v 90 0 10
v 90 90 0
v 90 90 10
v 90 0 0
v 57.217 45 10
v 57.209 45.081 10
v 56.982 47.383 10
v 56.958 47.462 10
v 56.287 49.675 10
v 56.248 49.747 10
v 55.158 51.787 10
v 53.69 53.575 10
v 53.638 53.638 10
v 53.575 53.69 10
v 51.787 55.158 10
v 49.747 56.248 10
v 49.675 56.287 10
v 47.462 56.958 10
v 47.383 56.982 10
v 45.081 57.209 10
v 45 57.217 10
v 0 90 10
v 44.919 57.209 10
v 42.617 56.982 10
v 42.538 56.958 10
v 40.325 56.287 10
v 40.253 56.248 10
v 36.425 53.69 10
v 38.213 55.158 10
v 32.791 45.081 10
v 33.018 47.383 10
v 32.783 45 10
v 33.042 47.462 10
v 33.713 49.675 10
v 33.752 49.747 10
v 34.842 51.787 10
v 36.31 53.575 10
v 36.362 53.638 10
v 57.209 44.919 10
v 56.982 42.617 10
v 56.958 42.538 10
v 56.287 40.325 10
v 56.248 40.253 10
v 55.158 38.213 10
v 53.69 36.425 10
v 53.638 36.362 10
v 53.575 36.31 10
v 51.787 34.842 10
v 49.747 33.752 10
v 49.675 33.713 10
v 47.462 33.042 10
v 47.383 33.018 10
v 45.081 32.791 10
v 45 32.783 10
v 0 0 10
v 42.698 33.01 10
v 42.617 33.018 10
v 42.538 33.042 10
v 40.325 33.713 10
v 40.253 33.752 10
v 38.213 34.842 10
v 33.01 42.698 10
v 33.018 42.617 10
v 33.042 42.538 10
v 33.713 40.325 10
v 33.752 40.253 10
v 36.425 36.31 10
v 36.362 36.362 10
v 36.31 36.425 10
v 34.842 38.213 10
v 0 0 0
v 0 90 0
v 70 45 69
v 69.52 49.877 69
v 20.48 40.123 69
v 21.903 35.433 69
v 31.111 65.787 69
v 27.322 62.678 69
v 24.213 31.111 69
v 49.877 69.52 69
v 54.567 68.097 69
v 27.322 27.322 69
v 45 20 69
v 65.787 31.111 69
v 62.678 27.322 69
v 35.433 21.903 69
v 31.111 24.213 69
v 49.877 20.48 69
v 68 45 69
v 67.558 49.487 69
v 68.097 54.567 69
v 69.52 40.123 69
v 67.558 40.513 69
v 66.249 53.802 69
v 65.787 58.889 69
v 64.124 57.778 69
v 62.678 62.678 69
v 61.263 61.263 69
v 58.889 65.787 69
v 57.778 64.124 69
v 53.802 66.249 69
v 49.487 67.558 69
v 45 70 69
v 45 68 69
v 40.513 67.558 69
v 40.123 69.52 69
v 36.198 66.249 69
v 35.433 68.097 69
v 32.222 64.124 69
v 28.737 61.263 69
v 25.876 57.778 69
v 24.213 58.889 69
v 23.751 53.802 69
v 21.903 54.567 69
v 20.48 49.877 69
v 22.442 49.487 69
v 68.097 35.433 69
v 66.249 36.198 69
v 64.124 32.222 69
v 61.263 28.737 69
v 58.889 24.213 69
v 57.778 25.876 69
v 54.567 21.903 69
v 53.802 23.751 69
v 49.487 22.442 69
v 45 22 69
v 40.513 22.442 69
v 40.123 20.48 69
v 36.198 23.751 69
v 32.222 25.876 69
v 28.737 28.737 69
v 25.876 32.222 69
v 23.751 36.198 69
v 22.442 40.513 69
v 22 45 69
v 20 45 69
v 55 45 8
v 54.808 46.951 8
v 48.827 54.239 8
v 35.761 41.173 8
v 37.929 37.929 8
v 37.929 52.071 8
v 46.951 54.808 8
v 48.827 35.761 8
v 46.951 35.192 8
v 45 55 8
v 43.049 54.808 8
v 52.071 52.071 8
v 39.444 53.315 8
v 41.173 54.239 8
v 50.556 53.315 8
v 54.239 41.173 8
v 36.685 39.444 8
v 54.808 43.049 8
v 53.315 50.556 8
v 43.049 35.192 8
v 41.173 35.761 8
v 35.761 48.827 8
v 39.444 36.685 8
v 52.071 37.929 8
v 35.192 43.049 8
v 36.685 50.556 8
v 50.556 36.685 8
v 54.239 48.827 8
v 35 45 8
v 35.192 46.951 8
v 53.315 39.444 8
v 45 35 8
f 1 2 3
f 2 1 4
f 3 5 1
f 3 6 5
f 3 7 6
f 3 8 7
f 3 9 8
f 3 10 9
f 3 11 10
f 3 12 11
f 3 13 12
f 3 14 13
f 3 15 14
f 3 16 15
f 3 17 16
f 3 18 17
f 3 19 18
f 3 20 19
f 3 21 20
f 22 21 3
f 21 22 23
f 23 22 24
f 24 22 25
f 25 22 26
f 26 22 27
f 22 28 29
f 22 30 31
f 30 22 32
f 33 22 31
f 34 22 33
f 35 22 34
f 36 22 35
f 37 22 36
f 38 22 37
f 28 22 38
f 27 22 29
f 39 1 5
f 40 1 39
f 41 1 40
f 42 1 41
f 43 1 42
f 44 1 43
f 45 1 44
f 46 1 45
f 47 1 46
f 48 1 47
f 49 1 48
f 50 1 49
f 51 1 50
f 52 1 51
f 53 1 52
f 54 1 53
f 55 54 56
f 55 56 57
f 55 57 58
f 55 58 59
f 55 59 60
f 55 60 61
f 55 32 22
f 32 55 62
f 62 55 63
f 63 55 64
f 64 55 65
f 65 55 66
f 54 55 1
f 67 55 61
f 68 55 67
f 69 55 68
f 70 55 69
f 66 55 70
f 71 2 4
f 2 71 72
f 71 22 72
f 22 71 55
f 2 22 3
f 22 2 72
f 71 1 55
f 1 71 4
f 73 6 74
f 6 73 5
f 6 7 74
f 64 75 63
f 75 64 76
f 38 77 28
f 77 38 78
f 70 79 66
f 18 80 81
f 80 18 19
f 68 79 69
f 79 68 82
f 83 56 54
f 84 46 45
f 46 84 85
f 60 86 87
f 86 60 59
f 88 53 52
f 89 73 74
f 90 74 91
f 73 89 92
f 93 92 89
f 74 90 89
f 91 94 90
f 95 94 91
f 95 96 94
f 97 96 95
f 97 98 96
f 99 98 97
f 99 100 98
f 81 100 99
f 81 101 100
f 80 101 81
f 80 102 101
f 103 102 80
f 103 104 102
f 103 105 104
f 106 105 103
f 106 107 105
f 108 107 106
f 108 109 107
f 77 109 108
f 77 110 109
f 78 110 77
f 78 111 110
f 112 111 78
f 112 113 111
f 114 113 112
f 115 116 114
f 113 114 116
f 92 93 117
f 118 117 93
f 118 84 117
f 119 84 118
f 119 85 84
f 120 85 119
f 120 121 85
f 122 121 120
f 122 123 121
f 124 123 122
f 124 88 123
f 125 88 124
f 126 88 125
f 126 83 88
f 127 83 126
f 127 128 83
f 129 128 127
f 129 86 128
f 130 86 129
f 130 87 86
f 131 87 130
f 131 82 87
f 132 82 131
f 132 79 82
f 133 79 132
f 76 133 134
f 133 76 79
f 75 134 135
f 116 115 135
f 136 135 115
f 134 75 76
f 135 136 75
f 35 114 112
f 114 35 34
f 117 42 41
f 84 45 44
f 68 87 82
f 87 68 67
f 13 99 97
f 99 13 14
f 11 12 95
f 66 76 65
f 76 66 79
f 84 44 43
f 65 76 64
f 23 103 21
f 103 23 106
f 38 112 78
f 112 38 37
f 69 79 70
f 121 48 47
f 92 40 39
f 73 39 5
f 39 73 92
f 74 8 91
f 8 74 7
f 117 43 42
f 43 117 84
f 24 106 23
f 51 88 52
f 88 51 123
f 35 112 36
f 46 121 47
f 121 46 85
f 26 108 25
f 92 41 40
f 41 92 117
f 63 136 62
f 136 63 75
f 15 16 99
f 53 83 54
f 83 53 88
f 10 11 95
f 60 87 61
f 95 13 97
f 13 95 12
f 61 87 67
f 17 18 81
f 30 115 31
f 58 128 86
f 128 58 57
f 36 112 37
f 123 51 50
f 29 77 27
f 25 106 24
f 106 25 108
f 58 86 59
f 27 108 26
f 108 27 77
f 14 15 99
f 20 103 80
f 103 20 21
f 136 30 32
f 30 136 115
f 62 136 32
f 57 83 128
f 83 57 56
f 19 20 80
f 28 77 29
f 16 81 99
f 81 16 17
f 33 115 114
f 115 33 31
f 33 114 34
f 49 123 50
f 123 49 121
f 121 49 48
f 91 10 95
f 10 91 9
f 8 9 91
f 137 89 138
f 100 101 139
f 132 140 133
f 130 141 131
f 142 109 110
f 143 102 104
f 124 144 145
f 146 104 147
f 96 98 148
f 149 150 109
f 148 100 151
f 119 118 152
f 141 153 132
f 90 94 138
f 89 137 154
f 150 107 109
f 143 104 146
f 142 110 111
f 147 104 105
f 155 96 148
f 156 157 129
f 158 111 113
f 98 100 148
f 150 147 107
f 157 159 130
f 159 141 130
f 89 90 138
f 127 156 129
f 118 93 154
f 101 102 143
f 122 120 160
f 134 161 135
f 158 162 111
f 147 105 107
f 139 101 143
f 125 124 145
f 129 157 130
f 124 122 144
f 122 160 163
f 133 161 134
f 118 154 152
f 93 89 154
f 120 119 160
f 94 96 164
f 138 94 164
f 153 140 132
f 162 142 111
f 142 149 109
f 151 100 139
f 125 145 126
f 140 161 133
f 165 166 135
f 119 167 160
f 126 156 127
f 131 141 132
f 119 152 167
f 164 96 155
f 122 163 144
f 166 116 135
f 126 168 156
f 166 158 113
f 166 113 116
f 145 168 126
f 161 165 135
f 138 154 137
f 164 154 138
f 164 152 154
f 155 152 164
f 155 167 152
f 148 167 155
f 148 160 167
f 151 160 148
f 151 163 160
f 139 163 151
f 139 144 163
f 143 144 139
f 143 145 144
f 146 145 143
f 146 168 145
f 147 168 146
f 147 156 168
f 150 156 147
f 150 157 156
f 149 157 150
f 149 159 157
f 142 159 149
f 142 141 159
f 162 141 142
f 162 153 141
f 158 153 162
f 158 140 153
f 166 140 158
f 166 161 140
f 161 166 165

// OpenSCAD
$fn = 32;

// ----------------------------------------------------------------------
// Hopper: funnel with square flange
// ----------------------------------------------------------------------

// --- parameters (mm) ---
fl = 90;                  // flange side, X and Y
fl_t = 10;                // flange thickness
cone_h = 60;              // cone height above the flange
top_d = 50;               // cone mouth diameter
bot_d = 24;               // cone spout diameter
wall = 2;                 // cone wall thickness

bore_d = bot_d - 2 * wall;  // spout bore diameter
total_h = fl_t + cone_h - 1;  // overall height

difference() {
  union() {
    cube([fl, fl, fl_t]);
    translate([fl / 2, fl / 2, fl_t - 1])
      cylinder(h = cone_h, d1 = bot_d, d2 = top_d);
  }
  translate([fl / 2, fl / 2, fl_t - 2])
    cylinder(h = cone_h + 1, d1 = bore_d, d2 = top_d - 2 * wall);
}
